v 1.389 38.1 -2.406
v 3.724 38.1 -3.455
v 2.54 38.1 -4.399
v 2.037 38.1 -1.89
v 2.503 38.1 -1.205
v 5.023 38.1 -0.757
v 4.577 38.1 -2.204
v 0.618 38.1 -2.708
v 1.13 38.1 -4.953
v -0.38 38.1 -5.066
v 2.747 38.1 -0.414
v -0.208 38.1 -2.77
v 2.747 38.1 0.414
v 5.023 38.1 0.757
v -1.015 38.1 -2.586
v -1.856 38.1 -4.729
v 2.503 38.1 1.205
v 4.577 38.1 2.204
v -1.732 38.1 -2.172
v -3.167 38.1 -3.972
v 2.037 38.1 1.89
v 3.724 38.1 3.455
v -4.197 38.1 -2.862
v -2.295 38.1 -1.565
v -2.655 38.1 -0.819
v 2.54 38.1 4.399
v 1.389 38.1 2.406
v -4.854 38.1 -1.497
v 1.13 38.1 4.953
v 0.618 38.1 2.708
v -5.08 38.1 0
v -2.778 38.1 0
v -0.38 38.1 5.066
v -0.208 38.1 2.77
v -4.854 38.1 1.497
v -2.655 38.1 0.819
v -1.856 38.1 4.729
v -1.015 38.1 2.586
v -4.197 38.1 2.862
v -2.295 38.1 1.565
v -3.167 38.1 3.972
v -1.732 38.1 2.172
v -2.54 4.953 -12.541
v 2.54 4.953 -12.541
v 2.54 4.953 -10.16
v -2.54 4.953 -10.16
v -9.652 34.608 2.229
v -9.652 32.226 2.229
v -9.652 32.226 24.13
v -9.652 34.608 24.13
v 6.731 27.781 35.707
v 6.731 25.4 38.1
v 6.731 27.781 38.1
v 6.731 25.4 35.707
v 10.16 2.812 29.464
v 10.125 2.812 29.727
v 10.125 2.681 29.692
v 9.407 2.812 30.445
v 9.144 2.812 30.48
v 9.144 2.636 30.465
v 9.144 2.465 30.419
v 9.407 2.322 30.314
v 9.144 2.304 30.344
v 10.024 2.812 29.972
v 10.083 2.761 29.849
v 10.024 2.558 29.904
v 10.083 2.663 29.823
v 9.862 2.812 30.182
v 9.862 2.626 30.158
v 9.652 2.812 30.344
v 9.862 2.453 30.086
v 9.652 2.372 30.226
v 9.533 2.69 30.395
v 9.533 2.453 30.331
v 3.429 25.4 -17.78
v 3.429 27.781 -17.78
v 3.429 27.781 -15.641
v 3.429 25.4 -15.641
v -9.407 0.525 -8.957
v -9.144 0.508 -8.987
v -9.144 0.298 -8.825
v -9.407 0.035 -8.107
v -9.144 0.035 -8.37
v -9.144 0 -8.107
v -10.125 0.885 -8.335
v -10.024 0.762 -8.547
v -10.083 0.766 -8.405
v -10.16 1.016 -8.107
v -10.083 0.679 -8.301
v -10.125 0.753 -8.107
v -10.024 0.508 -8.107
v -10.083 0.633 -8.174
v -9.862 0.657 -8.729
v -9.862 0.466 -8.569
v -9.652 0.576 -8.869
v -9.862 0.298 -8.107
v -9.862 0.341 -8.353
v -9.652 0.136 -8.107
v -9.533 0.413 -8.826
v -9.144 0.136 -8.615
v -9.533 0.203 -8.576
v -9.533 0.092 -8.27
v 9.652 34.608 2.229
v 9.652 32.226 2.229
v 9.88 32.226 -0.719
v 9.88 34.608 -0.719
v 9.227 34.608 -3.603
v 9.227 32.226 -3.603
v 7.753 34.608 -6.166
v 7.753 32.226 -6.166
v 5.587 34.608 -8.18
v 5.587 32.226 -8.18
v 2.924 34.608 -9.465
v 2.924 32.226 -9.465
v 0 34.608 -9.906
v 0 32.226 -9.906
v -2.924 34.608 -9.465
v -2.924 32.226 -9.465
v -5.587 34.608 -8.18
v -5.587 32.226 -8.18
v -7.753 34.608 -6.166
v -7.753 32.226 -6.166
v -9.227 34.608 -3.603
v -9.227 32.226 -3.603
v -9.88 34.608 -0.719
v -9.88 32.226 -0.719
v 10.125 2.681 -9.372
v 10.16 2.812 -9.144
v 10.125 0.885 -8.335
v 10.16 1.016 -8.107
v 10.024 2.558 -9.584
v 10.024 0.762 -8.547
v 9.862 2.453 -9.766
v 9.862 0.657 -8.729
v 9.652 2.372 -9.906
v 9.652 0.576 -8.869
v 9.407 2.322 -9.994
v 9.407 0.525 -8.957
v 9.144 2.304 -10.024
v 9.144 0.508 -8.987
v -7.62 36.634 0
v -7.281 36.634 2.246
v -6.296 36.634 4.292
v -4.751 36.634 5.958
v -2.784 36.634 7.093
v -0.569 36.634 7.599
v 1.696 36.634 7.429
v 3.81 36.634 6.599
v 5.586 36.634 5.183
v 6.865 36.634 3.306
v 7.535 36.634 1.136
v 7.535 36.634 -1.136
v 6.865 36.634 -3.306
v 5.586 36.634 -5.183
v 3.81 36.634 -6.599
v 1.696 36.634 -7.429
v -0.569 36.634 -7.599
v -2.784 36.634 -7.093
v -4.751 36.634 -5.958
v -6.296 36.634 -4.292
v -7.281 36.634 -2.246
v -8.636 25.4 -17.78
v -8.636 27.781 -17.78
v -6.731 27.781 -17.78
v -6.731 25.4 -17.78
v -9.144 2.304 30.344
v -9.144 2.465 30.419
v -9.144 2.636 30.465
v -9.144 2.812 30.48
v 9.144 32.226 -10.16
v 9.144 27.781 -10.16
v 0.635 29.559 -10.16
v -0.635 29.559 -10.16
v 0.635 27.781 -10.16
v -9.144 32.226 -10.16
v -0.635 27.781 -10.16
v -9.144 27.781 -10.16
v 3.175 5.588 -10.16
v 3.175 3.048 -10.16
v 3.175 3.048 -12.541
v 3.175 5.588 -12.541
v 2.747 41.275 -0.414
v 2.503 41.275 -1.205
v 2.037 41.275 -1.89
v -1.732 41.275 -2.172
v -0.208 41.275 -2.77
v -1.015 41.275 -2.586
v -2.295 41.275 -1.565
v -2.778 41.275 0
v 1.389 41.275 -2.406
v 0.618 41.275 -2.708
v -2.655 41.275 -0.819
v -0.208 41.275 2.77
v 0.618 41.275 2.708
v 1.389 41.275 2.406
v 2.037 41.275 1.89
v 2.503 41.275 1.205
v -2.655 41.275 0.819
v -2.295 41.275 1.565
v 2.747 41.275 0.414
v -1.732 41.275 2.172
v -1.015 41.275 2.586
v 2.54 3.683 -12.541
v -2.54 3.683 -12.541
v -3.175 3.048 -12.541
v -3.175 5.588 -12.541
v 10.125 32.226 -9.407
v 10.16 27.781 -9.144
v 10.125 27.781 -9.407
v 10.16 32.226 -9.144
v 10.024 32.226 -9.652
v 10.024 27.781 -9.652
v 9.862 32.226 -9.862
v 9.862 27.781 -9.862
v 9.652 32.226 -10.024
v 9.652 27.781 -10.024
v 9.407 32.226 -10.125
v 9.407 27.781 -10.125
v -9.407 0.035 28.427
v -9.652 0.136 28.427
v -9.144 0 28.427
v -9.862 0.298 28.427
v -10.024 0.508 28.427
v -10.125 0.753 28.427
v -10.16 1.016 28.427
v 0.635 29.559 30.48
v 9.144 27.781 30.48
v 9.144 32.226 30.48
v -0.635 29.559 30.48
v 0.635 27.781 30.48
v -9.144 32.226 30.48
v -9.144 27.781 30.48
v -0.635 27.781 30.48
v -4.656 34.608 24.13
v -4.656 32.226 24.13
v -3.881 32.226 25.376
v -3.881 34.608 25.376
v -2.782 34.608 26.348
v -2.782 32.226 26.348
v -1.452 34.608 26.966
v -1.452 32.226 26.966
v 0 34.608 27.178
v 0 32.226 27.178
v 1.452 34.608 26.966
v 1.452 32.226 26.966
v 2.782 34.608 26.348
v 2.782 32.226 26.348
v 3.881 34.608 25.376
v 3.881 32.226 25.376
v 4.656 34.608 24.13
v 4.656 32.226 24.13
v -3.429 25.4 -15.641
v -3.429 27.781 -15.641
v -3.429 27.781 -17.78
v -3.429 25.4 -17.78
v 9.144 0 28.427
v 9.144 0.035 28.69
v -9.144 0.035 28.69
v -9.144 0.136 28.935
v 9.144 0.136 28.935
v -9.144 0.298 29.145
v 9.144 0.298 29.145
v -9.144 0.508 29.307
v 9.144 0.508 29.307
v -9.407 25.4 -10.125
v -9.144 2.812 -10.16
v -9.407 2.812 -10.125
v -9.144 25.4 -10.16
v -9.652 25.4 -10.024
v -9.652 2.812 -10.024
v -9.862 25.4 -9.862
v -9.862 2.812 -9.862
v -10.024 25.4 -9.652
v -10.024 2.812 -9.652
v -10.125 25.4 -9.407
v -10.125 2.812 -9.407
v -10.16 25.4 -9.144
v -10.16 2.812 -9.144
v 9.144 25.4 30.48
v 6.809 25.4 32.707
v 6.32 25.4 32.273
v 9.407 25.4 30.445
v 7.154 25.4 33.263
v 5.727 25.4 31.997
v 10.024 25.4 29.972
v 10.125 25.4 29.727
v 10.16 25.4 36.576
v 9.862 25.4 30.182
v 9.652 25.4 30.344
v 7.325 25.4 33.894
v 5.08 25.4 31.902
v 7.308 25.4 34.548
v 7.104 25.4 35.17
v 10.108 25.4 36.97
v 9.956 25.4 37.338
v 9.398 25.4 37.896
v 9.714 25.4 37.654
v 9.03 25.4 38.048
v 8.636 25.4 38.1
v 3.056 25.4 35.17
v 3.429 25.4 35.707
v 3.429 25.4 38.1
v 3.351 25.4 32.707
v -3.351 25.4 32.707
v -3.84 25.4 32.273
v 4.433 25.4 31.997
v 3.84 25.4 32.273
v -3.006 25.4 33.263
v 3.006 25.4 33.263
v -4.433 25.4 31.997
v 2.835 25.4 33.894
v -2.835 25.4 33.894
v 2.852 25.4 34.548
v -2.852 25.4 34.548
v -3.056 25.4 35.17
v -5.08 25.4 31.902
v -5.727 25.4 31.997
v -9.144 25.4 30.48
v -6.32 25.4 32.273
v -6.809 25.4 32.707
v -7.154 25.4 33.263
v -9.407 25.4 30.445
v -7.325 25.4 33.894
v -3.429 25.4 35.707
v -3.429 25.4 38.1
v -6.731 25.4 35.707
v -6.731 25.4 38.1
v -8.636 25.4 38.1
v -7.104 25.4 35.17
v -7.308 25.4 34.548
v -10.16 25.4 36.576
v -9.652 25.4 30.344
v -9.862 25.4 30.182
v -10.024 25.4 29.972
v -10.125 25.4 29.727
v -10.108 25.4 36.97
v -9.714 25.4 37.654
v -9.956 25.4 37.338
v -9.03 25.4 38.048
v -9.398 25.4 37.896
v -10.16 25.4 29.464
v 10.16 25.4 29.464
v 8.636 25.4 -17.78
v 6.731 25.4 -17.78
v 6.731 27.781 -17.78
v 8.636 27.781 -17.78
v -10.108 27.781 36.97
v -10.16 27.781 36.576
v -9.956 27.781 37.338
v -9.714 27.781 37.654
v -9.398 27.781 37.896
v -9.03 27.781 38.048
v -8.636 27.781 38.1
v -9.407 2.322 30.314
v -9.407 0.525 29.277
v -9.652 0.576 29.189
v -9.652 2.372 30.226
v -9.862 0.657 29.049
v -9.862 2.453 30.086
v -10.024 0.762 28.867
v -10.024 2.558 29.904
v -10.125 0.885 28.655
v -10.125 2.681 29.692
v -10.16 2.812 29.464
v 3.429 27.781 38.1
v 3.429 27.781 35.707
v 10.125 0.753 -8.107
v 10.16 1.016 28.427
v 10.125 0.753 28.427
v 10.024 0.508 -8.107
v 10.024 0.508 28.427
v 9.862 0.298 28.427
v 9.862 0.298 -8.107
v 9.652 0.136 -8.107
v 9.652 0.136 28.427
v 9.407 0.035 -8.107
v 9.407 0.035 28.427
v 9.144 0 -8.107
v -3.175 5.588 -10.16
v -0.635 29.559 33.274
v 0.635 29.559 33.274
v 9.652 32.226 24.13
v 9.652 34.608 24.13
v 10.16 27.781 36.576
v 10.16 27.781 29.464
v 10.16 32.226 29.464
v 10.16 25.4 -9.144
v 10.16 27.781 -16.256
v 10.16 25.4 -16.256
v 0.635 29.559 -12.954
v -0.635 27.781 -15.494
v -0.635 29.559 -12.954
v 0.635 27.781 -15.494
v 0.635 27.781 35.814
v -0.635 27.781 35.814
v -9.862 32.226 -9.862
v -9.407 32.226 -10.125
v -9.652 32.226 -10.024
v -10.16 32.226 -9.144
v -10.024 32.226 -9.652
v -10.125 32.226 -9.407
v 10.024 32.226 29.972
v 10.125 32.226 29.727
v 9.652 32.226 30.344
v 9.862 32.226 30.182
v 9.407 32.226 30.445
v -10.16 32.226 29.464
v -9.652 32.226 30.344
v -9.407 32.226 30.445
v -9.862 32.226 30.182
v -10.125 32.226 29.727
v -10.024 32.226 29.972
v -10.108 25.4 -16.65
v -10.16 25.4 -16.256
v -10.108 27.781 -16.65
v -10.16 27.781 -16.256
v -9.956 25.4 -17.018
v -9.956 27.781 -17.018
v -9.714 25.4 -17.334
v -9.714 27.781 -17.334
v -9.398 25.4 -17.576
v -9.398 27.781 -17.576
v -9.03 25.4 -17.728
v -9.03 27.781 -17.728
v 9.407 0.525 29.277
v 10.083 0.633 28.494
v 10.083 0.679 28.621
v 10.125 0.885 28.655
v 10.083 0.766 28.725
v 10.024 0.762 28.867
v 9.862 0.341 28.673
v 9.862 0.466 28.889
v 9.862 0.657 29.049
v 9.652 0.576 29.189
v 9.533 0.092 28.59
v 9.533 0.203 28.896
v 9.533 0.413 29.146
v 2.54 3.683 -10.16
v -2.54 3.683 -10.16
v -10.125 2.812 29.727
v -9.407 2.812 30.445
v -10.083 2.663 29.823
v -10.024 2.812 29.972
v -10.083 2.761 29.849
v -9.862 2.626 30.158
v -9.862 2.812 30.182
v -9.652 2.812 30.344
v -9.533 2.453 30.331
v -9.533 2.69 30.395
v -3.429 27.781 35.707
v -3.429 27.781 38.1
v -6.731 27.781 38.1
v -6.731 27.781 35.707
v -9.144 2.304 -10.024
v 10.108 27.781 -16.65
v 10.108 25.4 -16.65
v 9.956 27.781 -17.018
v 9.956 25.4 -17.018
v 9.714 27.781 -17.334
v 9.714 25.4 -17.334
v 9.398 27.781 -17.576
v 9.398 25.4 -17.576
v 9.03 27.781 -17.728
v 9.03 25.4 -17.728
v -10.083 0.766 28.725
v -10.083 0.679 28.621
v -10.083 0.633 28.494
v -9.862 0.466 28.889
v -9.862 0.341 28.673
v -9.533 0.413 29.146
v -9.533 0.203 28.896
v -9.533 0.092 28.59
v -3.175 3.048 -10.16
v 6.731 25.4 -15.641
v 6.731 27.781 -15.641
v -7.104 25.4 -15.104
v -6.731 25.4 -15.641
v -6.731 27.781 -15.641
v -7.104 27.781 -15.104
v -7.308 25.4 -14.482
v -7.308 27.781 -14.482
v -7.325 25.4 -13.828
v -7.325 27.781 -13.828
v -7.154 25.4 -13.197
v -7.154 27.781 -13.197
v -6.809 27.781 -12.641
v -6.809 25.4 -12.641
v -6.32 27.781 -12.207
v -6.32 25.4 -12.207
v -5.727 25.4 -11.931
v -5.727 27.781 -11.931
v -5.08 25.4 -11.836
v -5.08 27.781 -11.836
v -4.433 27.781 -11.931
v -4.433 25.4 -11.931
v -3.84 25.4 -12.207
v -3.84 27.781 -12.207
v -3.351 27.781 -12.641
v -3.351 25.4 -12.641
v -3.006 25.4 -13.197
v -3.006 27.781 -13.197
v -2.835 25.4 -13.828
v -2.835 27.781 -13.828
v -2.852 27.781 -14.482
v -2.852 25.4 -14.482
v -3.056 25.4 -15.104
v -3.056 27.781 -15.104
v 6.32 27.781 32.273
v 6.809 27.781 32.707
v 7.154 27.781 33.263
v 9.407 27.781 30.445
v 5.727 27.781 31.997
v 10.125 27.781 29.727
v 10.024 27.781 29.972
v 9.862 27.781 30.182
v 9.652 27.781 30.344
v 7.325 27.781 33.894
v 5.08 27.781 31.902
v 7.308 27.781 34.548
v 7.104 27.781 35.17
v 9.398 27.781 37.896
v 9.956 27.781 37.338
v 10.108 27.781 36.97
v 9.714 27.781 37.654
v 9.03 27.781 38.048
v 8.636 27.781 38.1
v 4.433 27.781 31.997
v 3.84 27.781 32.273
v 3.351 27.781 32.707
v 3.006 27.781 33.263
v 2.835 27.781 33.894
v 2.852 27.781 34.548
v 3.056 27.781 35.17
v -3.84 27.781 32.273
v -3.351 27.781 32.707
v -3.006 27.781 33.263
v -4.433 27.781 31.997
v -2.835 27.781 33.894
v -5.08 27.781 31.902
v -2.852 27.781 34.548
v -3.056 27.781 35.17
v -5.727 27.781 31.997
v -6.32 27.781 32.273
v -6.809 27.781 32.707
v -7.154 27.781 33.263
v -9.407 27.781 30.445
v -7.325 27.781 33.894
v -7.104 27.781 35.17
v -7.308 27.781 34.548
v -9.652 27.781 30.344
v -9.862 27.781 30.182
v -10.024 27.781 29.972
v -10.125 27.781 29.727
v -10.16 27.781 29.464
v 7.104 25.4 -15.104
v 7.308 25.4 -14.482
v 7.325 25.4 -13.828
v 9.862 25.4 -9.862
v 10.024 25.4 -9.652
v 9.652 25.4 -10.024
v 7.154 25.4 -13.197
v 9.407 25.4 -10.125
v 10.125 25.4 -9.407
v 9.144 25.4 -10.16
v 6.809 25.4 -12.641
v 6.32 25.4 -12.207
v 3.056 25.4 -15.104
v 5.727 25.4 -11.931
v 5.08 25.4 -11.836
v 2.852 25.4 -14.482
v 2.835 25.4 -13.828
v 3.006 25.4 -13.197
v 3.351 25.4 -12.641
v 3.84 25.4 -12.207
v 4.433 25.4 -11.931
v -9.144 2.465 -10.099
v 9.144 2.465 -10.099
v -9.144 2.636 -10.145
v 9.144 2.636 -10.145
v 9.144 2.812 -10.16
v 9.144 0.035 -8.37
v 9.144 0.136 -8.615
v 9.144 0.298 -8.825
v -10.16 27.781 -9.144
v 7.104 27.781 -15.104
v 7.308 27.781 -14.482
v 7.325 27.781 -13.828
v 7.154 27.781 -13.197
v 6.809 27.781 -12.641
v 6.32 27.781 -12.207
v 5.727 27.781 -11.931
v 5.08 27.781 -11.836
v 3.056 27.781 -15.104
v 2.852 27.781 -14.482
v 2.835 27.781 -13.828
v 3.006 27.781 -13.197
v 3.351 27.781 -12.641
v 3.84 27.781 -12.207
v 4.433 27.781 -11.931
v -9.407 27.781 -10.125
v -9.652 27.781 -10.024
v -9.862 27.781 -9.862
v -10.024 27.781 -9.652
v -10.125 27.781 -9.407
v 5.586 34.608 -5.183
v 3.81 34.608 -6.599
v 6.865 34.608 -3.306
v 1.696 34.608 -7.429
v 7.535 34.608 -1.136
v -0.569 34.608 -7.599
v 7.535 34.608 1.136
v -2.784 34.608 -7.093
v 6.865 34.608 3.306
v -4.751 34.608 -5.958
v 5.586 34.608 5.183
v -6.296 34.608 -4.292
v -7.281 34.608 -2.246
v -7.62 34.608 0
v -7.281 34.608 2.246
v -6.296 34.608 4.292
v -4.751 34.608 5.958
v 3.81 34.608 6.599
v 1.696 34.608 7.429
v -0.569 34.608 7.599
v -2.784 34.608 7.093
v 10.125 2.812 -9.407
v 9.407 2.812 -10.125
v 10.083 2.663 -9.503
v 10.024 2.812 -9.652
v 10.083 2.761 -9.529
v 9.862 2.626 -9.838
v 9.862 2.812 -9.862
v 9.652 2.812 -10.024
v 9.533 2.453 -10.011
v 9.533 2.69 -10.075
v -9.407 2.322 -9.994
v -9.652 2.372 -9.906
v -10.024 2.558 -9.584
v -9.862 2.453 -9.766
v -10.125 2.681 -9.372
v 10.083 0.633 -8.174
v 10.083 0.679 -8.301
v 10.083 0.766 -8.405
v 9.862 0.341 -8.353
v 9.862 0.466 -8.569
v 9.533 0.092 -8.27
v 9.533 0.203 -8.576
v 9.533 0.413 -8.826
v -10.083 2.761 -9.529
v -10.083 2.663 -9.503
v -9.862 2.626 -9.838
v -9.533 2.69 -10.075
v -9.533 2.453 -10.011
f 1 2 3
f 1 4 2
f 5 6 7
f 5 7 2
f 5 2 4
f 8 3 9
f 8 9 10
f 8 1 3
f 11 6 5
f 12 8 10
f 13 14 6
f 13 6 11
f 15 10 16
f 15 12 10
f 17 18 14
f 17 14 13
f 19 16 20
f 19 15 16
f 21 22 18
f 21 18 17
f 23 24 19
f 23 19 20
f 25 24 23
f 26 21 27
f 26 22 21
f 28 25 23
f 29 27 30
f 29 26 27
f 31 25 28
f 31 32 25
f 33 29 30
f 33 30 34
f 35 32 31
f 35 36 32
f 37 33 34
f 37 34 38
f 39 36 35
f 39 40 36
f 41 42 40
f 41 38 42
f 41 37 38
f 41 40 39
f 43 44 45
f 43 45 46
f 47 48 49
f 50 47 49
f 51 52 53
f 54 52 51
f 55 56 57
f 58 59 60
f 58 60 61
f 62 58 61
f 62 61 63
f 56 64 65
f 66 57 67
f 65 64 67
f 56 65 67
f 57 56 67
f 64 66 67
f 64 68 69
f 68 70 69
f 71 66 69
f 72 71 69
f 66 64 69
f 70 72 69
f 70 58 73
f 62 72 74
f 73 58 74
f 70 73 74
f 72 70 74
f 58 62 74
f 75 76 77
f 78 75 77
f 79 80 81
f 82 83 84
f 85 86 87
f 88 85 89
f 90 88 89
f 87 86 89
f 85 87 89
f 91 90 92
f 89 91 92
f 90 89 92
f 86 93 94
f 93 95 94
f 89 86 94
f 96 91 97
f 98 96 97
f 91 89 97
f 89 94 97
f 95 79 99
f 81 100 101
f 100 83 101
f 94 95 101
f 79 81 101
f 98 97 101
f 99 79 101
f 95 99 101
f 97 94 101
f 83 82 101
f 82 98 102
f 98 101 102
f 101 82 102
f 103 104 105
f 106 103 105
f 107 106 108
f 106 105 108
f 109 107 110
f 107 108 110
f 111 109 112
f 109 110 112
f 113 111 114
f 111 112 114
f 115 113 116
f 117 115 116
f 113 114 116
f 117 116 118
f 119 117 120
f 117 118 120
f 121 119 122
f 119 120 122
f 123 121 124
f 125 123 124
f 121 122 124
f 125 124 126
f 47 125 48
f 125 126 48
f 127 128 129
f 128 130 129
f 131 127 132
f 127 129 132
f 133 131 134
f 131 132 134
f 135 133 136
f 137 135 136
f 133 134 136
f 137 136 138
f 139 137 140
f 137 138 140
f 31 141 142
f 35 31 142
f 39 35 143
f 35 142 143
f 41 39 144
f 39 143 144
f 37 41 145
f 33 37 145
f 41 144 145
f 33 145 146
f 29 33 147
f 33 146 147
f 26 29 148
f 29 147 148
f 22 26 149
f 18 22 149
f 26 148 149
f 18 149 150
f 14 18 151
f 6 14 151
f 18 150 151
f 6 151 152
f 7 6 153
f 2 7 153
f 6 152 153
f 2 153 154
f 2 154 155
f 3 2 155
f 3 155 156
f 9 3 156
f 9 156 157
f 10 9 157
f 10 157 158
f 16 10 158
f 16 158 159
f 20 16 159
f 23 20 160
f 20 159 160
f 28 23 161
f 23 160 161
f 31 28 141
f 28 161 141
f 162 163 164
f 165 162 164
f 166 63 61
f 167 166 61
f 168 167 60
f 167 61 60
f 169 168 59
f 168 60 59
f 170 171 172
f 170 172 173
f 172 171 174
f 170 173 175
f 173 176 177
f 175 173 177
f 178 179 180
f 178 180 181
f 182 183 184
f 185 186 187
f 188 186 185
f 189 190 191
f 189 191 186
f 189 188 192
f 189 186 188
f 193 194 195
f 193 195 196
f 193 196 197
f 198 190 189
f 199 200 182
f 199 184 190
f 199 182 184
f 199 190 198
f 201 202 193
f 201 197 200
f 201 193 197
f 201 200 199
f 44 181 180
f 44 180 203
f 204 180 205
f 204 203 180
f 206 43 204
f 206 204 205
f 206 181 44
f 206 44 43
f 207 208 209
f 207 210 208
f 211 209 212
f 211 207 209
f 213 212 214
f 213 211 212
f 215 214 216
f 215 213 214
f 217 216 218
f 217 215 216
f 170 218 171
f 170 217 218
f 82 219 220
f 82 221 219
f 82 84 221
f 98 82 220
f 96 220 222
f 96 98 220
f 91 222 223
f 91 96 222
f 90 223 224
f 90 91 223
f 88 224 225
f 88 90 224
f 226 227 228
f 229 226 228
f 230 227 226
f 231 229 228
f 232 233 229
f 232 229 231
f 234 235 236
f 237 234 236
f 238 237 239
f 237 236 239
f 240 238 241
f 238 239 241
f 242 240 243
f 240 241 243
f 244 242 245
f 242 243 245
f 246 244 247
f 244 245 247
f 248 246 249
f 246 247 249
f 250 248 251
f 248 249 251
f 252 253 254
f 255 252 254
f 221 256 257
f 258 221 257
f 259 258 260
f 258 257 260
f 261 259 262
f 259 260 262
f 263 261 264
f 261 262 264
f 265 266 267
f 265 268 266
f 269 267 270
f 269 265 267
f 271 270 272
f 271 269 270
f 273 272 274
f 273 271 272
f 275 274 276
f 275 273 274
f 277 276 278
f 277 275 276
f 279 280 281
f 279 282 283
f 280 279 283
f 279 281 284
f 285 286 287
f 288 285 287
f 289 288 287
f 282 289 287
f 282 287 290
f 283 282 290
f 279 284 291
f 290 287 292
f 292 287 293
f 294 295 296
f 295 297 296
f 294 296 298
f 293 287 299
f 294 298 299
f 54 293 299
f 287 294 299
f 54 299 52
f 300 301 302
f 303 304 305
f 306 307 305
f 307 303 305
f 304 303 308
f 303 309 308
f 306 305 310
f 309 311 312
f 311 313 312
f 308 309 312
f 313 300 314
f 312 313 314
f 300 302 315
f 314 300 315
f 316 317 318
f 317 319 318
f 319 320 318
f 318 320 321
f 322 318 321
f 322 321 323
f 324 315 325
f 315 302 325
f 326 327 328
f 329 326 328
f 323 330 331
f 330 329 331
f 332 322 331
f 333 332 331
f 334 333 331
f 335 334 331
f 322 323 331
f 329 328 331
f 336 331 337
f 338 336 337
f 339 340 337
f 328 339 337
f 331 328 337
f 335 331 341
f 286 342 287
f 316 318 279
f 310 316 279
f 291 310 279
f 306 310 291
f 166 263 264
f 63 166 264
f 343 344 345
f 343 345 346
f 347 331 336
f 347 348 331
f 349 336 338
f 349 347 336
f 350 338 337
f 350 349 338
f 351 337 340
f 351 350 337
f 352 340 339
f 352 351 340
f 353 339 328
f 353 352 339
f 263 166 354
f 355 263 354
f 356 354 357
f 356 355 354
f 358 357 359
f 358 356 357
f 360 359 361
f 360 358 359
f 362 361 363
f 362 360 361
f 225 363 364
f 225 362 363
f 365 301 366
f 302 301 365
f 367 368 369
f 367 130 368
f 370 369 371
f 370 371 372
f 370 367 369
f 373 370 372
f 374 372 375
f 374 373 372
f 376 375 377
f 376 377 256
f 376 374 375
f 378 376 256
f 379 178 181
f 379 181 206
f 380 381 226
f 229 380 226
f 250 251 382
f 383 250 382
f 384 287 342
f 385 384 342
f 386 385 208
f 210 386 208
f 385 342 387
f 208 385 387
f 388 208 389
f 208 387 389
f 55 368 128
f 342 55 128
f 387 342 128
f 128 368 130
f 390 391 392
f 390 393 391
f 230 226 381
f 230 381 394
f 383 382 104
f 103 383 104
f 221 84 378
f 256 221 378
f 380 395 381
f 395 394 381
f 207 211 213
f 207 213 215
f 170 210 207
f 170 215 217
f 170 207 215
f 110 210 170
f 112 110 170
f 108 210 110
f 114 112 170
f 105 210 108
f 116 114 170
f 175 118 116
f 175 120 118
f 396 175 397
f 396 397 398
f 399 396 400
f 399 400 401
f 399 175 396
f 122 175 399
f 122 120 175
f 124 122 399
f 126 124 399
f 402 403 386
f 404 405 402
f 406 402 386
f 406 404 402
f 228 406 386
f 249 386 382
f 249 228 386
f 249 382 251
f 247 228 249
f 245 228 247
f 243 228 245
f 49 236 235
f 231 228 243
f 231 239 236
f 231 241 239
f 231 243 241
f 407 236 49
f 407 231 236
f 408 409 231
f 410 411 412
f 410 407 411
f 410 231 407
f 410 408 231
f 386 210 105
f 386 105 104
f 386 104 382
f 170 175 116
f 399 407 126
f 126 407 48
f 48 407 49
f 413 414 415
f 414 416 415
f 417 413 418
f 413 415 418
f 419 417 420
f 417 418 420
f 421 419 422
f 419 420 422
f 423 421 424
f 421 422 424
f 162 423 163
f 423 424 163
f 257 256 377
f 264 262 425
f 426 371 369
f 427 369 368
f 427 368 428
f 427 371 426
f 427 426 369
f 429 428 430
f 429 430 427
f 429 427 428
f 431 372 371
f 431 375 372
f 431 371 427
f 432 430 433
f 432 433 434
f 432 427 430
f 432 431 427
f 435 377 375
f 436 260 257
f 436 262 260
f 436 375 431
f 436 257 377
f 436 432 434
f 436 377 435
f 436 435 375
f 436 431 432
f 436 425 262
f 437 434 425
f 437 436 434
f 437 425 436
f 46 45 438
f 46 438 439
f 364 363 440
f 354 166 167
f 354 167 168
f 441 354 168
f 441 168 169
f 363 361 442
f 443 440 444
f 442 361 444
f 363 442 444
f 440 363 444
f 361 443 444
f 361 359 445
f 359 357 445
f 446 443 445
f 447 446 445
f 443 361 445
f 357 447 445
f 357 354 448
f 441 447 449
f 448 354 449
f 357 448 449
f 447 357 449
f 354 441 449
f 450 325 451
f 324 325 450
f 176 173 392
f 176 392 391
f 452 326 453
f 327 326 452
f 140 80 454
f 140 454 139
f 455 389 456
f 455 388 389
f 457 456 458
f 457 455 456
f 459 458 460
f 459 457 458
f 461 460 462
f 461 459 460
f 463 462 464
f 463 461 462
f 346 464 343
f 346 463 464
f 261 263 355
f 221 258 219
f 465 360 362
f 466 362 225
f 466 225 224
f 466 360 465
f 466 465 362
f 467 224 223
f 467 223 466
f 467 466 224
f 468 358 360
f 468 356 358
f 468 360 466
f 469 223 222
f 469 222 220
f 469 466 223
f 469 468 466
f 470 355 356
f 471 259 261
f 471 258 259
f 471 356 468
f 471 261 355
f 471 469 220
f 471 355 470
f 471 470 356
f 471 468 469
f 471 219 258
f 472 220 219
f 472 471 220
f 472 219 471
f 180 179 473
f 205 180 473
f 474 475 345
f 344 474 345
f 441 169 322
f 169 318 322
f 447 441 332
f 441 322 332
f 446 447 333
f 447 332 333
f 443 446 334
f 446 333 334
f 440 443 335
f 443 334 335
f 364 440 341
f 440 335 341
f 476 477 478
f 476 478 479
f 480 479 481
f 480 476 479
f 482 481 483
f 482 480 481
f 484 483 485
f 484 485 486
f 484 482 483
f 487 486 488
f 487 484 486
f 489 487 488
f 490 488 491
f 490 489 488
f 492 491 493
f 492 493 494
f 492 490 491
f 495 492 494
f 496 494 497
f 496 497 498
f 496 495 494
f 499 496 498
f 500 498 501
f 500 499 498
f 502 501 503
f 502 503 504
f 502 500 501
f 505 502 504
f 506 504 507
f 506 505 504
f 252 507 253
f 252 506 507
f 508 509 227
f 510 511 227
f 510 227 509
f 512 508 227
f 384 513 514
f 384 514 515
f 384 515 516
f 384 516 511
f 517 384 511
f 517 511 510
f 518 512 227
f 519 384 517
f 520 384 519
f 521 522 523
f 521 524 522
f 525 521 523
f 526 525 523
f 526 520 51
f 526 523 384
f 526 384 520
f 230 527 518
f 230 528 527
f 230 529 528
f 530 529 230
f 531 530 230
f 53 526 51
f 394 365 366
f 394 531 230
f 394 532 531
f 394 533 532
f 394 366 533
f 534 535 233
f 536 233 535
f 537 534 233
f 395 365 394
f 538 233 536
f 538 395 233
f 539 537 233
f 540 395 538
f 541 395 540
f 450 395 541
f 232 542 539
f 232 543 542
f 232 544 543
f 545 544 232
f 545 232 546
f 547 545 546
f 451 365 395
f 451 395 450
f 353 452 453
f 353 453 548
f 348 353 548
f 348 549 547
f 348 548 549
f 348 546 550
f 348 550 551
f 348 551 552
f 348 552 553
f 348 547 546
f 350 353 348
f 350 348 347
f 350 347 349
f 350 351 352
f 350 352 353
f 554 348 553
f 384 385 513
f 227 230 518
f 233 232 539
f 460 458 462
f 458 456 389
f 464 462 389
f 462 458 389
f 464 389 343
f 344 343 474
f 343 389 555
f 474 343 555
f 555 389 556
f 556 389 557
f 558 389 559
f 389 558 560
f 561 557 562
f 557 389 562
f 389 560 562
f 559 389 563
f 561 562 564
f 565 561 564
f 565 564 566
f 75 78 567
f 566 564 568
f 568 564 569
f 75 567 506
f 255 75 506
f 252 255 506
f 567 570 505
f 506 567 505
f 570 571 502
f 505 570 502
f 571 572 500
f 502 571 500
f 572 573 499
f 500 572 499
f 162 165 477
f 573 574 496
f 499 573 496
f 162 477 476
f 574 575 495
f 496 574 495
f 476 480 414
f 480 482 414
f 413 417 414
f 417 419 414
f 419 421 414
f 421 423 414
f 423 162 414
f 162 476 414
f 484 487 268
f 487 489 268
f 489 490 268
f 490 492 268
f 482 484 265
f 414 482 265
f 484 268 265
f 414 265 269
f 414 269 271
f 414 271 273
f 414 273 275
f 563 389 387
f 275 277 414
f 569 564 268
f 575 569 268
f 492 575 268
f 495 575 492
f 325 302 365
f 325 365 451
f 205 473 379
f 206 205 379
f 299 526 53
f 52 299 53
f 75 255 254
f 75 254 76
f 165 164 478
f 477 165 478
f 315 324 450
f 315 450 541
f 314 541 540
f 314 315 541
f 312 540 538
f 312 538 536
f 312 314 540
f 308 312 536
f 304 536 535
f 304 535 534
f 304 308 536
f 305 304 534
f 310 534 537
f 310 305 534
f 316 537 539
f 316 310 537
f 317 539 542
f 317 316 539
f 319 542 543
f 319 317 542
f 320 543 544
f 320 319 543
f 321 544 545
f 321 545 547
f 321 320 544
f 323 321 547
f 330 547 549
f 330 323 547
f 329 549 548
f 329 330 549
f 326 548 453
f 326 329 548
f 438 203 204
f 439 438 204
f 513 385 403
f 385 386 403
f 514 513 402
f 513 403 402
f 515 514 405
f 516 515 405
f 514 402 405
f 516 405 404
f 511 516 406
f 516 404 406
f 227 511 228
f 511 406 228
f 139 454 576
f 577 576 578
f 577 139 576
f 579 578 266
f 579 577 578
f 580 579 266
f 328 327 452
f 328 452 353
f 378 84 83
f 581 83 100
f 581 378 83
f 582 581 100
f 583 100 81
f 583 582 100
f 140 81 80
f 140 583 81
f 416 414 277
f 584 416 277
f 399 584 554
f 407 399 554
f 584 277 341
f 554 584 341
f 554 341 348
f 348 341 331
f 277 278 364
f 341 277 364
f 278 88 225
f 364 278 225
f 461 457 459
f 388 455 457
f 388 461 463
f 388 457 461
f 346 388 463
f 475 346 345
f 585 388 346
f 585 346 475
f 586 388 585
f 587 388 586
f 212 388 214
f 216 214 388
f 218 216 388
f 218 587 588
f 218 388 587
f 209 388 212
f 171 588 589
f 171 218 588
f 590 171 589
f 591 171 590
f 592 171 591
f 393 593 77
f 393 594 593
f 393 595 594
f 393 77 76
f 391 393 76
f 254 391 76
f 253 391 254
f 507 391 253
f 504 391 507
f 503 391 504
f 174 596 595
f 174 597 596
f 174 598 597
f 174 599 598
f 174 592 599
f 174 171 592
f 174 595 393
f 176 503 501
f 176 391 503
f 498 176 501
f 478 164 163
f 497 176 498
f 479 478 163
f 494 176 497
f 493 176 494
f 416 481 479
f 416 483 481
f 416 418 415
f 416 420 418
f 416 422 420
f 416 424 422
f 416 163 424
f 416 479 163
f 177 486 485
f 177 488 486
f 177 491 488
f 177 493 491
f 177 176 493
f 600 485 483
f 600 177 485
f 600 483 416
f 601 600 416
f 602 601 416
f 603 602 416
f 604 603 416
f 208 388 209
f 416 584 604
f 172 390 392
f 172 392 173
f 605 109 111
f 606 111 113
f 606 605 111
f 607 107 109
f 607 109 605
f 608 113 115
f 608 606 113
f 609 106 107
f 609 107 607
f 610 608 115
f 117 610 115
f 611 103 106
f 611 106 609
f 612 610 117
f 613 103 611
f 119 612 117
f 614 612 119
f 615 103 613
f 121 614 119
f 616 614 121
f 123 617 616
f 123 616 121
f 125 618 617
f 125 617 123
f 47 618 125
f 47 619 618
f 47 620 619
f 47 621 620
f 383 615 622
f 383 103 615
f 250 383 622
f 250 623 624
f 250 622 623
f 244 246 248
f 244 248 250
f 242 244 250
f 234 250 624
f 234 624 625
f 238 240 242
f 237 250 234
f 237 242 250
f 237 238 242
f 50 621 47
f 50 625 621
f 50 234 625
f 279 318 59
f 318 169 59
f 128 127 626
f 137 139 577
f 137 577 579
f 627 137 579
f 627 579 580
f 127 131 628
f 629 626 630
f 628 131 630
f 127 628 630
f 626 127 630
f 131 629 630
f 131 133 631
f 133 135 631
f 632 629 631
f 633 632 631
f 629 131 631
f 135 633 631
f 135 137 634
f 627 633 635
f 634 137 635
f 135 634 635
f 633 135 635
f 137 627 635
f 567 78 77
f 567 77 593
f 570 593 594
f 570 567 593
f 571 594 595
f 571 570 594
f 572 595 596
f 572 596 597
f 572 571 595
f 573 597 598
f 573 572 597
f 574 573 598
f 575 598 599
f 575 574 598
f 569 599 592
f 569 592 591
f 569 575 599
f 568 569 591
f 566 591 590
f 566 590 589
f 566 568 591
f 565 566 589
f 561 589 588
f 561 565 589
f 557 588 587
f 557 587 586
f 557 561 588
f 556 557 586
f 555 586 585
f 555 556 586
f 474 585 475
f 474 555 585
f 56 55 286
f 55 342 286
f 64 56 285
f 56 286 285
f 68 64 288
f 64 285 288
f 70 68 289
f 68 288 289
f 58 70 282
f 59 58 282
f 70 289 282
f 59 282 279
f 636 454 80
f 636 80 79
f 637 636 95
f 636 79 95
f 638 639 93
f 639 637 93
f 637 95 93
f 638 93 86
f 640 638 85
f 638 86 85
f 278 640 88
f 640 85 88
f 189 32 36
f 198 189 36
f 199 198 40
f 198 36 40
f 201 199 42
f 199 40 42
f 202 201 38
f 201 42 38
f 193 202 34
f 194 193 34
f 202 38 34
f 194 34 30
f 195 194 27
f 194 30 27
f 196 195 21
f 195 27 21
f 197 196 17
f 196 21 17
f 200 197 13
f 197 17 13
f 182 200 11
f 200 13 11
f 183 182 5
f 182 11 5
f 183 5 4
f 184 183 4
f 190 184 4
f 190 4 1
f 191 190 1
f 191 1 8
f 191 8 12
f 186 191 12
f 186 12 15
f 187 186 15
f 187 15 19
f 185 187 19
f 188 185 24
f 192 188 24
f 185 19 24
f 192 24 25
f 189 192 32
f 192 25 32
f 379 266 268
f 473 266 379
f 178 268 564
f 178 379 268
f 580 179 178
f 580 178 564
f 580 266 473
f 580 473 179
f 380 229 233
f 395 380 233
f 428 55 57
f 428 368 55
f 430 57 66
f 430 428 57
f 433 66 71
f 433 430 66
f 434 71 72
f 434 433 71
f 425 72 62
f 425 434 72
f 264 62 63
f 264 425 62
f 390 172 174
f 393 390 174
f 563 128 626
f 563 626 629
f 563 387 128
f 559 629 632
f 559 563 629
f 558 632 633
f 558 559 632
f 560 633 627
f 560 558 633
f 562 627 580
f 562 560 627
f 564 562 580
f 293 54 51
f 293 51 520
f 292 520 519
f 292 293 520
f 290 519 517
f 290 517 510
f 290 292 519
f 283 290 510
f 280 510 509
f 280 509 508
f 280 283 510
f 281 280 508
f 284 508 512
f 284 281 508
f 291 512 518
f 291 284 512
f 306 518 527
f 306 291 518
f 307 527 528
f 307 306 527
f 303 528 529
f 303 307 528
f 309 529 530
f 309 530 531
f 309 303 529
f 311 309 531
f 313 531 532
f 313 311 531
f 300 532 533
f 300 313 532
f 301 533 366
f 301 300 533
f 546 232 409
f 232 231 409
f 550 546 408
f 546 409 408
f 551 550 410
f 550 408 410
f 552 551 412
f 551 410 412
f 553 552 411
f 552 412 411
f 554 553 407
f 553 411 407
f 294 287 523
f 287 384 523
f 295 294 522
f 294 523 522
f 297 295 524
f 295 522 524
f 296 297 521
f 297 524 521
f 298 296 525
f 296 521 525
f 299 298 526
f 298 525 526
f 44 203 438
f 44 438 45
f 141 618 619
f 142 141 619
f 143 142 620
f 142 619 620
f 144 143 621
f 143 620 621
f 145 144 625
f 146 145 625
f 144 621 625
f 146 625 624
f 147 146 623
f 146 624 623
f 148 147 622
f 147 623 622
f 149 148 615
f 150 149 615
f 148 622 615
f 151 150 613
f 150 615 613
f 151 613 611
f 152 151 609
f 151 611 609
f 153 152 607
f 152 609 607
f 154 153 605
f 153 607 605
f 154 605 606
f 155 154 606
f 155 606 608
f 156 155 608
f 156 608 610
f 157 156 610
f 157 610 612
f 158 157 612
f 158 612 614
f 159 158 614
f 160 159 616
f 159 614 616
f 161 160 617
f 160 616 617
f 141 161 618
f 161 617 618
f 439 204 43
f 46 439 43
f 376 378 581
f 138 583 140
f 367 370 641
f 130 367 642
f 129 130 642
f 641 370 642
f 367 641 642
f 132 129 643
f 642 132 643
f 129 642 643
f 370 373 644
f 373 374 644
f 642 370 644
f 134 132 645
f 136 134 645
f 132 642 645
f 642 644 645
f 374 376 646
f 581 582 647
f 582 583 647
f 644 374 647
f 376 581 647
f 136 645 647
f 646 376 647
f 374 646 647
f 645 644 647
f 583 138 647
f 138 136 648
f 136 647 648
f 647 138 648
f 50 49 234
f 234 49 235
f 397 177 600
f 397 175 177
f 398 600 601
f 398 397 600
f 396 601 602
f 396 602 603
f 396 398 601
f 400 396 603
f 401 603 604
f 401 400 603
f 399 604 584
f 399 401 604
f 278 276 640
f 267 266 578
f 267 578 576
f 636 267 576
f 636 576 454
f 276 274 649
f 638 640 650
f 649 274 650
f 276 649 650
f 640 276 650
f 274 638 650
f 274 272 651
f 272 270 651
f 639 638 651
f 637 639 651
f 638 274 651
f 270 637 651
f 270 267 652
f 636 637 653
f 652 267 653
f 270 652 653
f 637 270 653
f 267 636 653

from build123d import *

# Parameters (mm, degrees)
SKETCH1_W             = 20.32
SKETCH1_H             = 40.64
EXTRUDE1_DEPTH        = 25.4
SKETCH2_W             = 20.32
SKETCH2_H             = 40.64
EXTRUDE2_DEPTH        = 2.38125
SKETCH3_W             = 20.32
SKETCH3_H             = 40.64
EXTRUDE3_DEPTH        = 4.445
EXTRUDE4_DEPTH        = 2.38125
SKETCH5_R             = 7.62
EXTRUDE5_DEPTH        = 3.4925
CHAMFER1_SIZE         = 2.54
CHAMFER1_SIZE2        = 1.466469684
EXTRUDE6_DEPTH        = 0.635
SKETCH8_R             = 2.778125
EXTRUDE7_DEPTH        = 3.175
CHAMFER2_SIZE         = 2.54
CHAMFER2_SIZE2        = 1.466469684
CHAMFER2_PART_2_SIZE  = 2.54
CHAMFER2_PART_2_SIZE2 = 1.466469684
FILLET1_R             = 1.016
FILLET2_R             = 1.524
SKETCH9_W             = 6.35
SKETCH9_H             = 2.54
EXTRUDE8_DEPTH        = 2.38125
SKETCH10_W            = 5.08
SKETCH10_H            = 1.27
CUT_EXTRUDE1_DEPTH    = 2.38125


with BuildPart() as part:
    # Sketch1 → Extrude1 (new body)
    with BuildSketch(Plane(origin=(0, 0, 0), x_dir=(1, 0, 0), z_dir=(0, 1, 0))):
        with Locations((0, -10.16)):
            Rectangle(SKETCH1_W, SKETCH1_H)
    extrude(amount=EXTRUDE1_DEPTH)

    # Sketch2 → Extrude2 (add)
    with BuildSketch(Plane(origin=(0, 25.4, 0), x_dir=(-1, 0, 0), z_dir=(0, 1, 0))):
        with Locations((0, 10.16)):
            Rectangle(SKETCH2_W, SKETCH2_H)
        with BuildLine():
            ThreePointArc((6.731, -15.64118631), (5.08, -11.8364), (3.429, -15.64118631))
            Line((3.429, -15.64118631), (3.429, -17.78))
            Line((3.429, -17.78), (-3.429, -17.78))
            Line((-3.429, -17.78), (-3.429, -15.64118631))
            ThreePointArc((-3.429, -15.64118631), (-5.08, -11.8364), (-6.731, -15.64118631))
            Line((-6.731, -15.64118631), (-6.731, -17.78))
            Line((-6.731, -17.78), (-10.16, -17.78))
            Line((-10.16, -17.78), (-10.16, -10.16))
            Line((-10.16, -10.16), (10.16, -10.16))
            Line((10.16, -10.16), (10.16, -17.78))
            Line((10.16, -17.78), (6.731, -17.78))
            Line((6.731, -17.78), (6.731, -15.64118631))
        make_face()
        with BuildLine():
            ThreePointArc((-6.731, 35.70718631), (-5.08, 31.9024), (-3.429, 35.70718631))
            Line((-3.429, 35.70718631), (-3.429, 38.1))
            Line((-3.429, 38.1), (3.429, 38.1))
            Line((3.429, 38.1), (3.429, 35.70718631))
            ThreePointArc((3.429, 35.70718631), (5.08, 31.9024), (6.731, 35.70718631))
            Line((6.731, 35.70718631), (6.731, 38.1))
            Line((6.731, 38.1), (10.16, 38.1))
            Line((10.16, 38.1), (10.16, 30.48))
            Line((10.16, 30.48), (-10.16, 30.48))
            Line((-10.16, 30.48), (-10.16, 38.1))
            Line((-10.16, 38.1), (-6.731, 38.1))
            Line((-6.731, 38.1), (-6.731, 35.70718631))
        make_face()
    extrude(amount=EXTRUDE2_DEPTH)

    # Sketch3 → Extrude3 (add)
    with BuildSketch(Plane(origin=(0, 27.78125, 0), x_dir=(-1, 0, 0), z_dir=(0, 1, 0))):
        with Locations((0, 10.16)):
            Rectangle(SKETCH3_W, SKETCH3_H)
    extrude(amount=EXTRUDE3_DEPTH)

    # Sketch4 → Extrude4 (add)
    with BuildSketch(Plane(origin=(0, 32.22625, 0), x_dir=(-1, 0, 0), z_dir=(0, 1, 0))):
        with BuildLine():
            Line((9.652, 2.228840954), (9.652, 24.13))
            Line((9.652, 24.13), (4.655896906, 24.13))
            ThreePointArc((4.655896906, 24.13), (0, 27.178), (-4.655896906, 24.13))
            Line((-4.655896906, 24.13), (-9.652, 24.13))
            Line((-9.652, 24.13), (-9.652, 2.228840954))
            ThreePointArc((-9.652, 2.228840954), (0, -9.906), (9.652, 2.228840954))
        make_face()
    extrude(amount=EXTRUDE4_DEPTH)

    # Sketch5 → Extrude5 (add)
    with BuildSketch(Plane(origin=(0, 34.6075, 0), x_dir=(-1, 0, 0), z_dir=(0, 1, 0))):
        Circle(SKETCH5_R)
    extrude(amount=EXTRUDE5_DEPTH)

    # Chamfer1
    chamfer1_edges = [part.edges().sort_by_distance(p)[0] for p in [
        (7.62, 38.1, 0),
    ]]
    chamfer1_side = [part.faces().sort_by_distance(p)[0] for p in [
        (0, 38.1, 0),
    ]]
    chamfer(chamfer1_edges, length=CHAMFER1_SIZE, length2=CHAMFER1_SIZE2, reference=chamfer1_side[0])

    # Sketch7 → Extrude6 (add, symmetric)
    with BuildSketch(Plane(origin=(0, 0, 0), x_dir=(0, 0, -1), z_dir=(1, 0, 0))):
        Polygon((15.494, 27.78125), (12.954, 29.55925), (10.16, 29.55925), (10.16, 27.78125), align=None)
    extrude6 = extrude(amount=EXTRUDE6_DEPTH, both=True)

    # Mirror1: Extrude6 across plane
    add(extrude6.mirror(Plane(origin=(0, 0, 10.16), x_dir=(1, 0, 0), z_dir=(0, 0, -1))))

    # Sketch8 → Extrude7 (add)
    with BuildSketch(Plane(origin=(0, 38.1, 0), x_dir=(-1, 0, 0), z_dir=(0, 1, 0))):
        Circle(SKETCH8_R)
    extrude(amount=EXTRUDE7_DEPTH)

    # Chamfer2
    chamfer2_edges = [part.edges().sort_by_distance(p)[0] for p in [
        (0, 0, -10.16),
    ]]
    chamfer2_side = [part.faces().sort_by_distance(p)[0] for p in [
        (0, 12.7, -10.16),
    ]]
    chamfer(chamfer2_edges, length=CHAMFER2_SIZE, length2=CHAMFER2_SIZE2, reference=chamfer2_side[0])

    # Chamfer2 part 2
    chamfer2_part_2_edges = [part.edges().sort_by_distance(p)[0] for p in [
        (0, 0, 30.48),
    ]]
    chamfer2_part_2_side = [part.faces().sort_by_distance(p)[0] for p in [
        (0, 12.7, 30.48),
    ]]
    chamfer(chamfer2_part_2_edges, length=CHAMFER2_PART_2_SIZE, length2=CHAMFER2_PART_2_SIZE2, reference=chamfer2_part_2_side[0])

    # Fillet1
    fillet1_edges = [part.edges().sort_by_distance(p)[0] for p in [
        (-10.16, 30.00375, -10.16),
        (10.16, 30.00375, -10.16),
        (10.16, 30.00375, 30.48),
        (10.16, 0, 10.16),
        (10.16, 1.27, -9.426765158),
        (10.16, 13.97, -10.16),
        (0, 0, -8.693530316),
        (0, 2.54, -10.16),
        (-10.16, 13.97, -10.16),
        (-10.16, 1.27, -9.426765158),
        (10.16, 13.97, 30.48),
        (10.16, 1.27, 29.746765158),
        (0, 2.54, 30.48),
        (-10.16, 0, 10.16),
        (0, 0, 29.013530316),
        (-10.16, 1.27, 29.746765158),
        (-10.16, 13.97, 30.48),
        (-10.16, 30.00375, 30.48),
    ]]
    fillet(fillet1_edges, radius=FILLET1_R)

    # Fillet2
    fillet2_edges = [part.edges().sort_by_distance(p)[0] for p in [
        (-10.16, 26.590625, 38.1),
        (10.16, 26.590625, 38.1),
        (-10.16, 26.590625, -17.78),
        (10.16, 26.590625, -17.78),
    ]]
    fillet(fillet2_edges, radius=FILLET2_R)

    # Sketch9 → Extrude8 (add)
    with BuildSketch(Plane(origin=(0, 0, -10.16), x_dir=(-1, 0, 0), z_dir=(0, 0, -1))):
        with Locations((0, 4.318)):
            Rectangle(SKETCH9_W, SKETCH9_H)
    extrude(amount=EXTRUDE8_DEPTH)

    # Sketch10 → Cut-Extrude1 (cut)
    with BuildSketch(Plane(origin=(0, 0, -12.54125), x_dir=(-1, 0, 0), z_dir=(0, 0, -1))):
        with Locations((0, 4.318)):
            Rectangle(SKETCH10_W, SKETCH10_H)
    extrude(amount=-CUT_EXTRUDE1_DEPTH, mode=Mode.SUBTRACT)


solid = part.part
